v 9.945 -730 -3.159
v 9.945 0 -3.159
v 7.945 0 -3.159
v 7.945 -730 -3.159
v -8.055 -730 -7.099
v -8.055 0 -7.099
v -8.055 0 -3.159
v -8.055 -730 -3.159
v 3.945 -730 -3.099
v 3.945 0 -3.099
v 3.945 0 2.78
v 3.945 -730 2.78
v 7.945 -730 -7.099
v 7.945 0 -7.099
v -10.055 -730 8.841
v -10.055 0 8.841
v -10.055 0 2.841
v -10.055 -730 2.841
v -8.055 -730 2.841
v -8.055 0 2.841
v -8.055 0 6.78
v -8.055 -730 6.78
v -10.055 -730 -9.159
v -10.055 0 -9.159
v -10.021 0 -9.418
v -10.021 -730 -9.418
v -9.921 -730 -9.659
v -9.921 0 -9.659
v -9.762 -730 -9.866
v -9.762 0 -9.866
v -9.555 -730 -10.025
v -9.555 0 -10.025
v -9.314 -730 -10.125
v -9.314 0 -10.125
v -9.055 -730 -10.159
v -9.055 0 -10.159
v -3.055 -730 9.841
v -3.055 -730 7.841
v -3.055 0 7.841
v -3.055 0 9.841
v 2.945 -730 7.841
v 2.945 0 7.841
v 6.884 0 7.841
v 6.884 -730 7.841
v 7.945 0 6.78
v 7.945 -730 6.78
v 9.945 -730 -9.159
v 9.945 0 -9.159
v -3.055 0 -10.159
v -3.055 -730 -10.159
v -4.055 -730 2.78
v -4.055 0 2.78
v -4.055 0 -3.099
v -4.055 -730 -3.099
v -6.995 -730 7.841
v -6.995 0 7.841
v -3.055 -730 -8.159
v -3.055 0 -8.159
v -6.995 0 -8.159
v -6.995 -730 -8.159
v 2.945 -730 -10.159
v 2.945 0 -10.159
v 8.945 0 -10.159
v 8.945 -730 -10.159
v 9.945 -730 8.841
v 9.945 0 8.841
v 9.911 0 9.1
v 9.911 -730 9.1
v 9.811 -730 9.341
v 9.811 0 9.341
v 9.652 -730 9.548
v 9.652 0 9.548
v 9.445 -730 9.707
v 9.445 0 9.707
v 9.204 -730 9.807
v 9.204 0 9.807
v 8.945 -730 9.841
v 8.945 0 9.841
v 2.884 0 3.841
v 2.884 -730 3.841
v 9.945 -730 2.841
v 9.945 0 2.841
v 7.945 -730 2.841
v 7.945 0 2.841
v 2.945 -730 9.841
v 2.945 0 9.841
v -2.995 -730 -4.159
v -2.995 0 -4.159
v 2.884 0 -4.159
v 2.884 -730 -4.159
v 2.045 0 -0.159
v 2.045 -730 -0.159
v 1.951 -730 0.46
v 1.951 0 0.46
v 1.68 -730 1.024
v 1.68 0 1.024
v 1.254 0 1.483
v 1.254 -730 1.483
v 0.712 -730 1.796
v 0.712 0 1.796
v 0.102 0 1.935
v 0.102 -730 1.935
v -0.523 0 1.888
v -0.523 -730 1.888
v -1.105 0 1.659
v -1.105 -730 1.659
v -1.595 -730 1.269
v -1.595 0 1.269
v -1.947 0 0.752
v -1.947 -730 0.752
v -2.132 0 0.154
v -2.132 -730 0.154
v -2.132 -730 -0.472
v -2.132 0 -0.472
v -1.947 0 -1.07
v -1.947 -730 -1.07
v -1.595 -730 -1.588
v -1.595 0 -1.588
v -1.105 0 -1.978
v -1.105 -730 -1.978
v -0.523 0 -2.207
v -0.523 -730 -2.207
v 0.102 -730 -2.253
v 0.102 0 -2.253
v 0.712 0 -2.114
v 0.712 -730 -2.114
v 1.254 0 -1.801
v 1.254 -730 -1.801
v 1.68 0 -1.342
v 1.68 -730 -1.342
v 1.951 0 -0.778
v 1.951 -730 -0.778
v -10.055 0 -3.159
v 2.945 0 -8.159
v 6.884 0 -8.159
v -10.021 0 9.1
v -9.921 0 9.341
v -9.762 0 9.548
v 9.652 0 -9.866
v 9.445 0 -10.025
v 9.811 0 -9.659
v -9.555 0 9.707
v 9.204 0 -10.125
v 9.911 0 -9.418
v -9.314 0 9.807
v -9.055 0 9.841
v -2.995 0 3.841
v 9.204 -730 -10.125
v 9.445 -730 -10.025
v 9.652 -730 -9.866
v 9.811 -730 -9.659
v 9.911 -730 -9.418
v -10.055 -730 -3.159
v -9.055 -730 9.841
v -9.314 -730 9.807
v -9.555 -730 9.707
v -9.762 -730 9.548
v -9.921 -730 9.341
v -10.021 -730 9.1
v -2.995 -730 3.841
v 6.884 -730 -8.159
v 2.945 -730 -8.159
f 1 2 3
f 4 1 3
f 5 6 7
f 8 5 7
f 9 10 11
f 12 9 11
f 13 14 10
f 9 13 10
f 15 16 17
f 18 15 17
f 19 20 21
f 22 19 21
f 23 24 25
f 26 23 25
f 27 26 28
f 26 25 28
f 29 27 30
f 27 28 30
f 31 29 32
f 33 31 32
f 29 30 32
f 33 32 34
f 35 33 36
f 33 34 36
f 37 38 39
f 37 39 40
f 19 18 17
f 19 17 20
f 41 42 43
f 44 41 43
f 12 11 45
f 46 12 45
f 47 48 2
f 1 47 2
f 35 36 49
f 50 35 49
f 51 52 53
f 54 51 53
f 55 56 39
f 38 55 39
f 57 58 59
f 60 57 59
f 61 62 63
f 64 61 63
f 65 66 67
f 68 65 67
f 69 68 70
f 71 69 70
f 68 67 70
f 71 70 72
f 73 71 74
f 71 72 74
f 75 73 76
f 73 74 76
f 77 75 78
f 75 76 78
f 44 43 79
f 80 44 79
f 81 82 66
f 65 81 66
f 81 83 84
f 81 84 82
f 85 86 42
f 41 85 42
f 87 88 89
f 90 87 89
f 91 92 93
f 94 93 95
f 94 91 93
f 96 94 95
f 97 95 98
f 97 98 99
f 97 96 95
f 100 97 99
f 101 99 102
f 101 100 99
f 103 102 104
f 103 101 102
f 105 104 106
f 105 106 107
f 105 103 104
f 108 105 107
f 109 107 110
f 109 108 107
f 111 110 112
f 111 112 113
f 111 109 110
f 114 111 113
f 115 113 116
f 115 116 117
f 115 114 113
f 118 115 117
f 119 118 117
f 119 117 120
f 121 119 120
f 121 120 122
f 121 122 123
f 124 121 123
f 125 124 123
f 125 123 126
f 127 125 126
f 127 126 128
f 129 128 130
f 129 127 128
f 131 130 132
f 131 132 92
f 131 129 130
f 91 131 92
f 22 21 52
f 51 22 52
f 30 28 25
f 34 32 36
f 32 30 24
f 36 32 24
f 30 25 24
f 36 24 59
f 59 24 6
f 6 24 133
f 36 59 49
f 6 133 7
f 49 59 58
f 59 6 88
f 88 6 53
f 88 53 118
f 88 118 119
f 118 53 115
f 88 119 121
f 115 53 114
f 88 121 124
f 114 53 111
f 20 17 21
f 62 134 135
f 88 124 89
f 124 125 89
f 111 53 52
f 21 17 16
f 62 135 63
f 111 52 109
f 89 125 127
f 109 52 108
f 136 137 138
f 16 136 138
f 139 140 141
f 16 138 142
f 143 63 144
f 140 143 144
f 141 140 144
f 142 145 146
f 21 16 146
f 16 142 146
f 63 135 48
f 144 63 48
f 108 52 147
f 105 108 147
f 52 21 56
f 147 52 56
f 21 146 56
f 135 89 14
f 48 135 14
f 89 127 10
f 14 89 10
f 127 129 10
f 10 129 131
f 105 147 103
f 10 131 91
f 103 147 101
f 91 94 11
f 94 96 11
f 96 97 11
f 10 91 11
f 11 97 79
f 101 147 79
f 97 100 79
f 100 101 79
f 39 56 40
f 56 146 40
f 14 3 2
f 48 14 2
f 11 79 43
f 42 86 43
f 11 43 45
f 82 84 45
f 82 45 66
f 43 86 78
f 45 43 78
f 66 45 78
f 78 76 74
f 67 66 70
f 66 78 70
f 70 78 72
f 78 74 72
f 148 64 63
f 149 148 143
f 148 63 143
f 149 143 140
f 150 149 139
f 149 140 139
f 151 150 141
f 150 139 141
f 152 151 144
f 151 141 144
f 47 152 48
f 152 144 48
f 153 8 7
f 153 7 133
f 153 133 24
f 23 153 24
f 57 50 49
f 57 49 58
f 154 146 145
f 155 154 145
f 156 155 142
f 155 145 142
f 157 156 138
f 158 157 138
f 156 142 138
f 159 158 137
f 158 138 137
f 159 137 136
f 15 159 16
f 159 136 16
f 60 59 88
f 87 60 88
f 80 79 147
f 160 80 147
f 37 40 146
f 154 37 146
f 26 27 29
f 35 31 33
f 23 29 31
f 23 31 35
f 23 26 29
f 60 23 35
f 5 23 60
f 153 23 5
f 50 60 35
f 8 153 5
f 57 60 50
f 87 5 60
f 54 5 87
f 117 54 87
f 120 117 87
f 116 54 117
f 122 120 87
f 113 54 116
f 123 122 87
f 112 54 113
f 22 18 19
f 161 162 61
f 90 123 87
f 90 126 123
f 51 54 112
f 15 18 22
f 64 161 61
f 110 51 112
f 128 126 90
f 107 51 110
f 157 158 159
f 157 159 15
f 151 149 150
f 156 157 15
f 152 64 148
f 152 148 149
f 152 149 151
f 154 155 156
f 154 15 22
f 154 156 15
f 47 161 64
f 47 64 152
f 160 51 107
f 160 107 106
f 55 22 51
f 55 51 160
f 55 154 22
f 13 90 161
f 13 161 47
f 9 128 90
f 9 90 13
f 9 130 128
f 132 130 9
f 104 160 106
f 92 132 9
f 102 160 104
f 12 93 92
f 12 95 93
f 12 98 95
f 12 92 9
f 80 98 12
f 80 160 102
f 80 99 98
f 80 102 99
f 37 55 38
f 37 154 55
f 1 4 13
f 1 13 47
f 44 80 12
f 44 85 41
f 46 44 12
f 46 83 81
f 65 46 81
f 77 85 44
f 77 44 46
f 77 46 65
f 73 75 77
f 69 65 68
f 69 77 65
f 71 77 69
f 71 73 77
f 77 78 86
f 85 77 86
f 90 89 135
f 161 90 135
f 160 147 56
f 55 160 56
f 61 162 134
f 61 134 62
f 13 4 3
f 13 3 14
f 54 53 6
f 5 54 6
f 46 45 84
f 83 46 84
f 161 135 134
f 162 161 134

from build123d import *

# Parameters (mm, degrees)
F0_R     = 2.1
F1_DEPTH = 730


with BuildPart() as f1:
    # F0 (on Front) → F1 (new body)
    with BuildSketch(Plane.XZ):
        with BuildLine():
            ThreePointArc((9.944745, 8.840758), (9.651851, 9.547865), (8.944745, 9.840758))
            Line((8.944745, 9.840758), (2.944745, 9.840758))
            Line((2.944745, 9.840758), (2.944745, 7.840758))
            Line((2.944745, 7.840758), (6.884085, 7.840758))
            Line((6.884085, 7.840758), (2.884085, 3.840758))
            Line((2.884085, 3.840758), (-2.994595, 3.840758))
            Line((-2.994595, 3.840758), (-6.994595, 7.840758))
            Line((-6.994595, 7.840758), (-3.055255, 7.840758))
            Line((-3.055255, 7.840758), (-3.055255, 9.840758))
            Line((-3.055255, 9.840758), (-9.055255, 9.840758))
            ThreePointArc((-9.055255, 9.840758), (-9.762362, 9.547865), (-10.055255, 8.840758))
            Line((-10.055255, 8.840758), (-10.055255, 2.840758))
            Line((-10.055255, 2.840758), (-8.055255, 2.840758))
            Line((-8.055255, 2.840758), (-8.055255, 6.780098))
            Line((-8.055255, 6.780098), (-4.055255, 2.780098))
            Line((-4.055255, 2.780098), (-4.055255, -3.098581))
            Line((-4.055255, -3.098581), (-8.055255, -7.098581))
            Line((-8.055255, -7.098581), (-8.055255, -3.159242))
            Line((-8.055255, -3.159242), (-10.055255, -3.159242))
            Line((-10.055255, -3.159242), (-10.055255, -9.159242))
            ThreePointArc((-10.055255, -9.159242), (-9.762362, -9.866348), (-9.055255, -10.159242))
            Line((-9.055255, -10.159242), (-3.055255, -10.159242))
            Line((-3.055255, -10.159242), (-3.055255, -8.159242))
            Line((-3.055255, -8.159242), (-6.994595, -8.159242))
            Line((-6.994595, -8.159242), (-2.994595, -4.159242))
            Line((-2.994595, -4.159242), (2.884085, -4.159242))
            Line((2.884085, -4.159242), (6.884085, -8.159242))
            Line((6.884085, -8.159242), (2.944745, -8.159242))
            Line((2.944745, -8.159242), (2.944745, -10.159242))
            Line((2.944745, -10.159242), (8.944745, -10.159242))
            ThreePointArc((8.944745, -10.159242), (9.651851, -9.866348), (9.944745, -9.159242))
            Line((9.944745, -9.159242), (9.944745, -3.159242))
            Line((9.944745, -3.159242), (7.944745, -3.159242))
            Line((7.944745, -3.159242), (7.944745, -7.098581))
            Line((7.944745, -7.098581), (3.944745, -3.098581))
            Line((3.944745, -3.098581), (3.944745, 2.780098))
            Line((3.944745, 2.780098), (7.944745, 6.780098))
            Line((7.944745, 6.780098), (7.944745, 2.840758))
            Line((7.944745, 2.840758), (9.944745, 2.840758))
            Line((9.944745, 2.840758), (9.944745, 8.840758))
        make_face()
        with Locations((-0.055255, -0.159242)):
            Circle(F0_R, mode=Mode.SUBTRACT)
    extrude(amount=F1_DEPTH)


solid = f1.part
